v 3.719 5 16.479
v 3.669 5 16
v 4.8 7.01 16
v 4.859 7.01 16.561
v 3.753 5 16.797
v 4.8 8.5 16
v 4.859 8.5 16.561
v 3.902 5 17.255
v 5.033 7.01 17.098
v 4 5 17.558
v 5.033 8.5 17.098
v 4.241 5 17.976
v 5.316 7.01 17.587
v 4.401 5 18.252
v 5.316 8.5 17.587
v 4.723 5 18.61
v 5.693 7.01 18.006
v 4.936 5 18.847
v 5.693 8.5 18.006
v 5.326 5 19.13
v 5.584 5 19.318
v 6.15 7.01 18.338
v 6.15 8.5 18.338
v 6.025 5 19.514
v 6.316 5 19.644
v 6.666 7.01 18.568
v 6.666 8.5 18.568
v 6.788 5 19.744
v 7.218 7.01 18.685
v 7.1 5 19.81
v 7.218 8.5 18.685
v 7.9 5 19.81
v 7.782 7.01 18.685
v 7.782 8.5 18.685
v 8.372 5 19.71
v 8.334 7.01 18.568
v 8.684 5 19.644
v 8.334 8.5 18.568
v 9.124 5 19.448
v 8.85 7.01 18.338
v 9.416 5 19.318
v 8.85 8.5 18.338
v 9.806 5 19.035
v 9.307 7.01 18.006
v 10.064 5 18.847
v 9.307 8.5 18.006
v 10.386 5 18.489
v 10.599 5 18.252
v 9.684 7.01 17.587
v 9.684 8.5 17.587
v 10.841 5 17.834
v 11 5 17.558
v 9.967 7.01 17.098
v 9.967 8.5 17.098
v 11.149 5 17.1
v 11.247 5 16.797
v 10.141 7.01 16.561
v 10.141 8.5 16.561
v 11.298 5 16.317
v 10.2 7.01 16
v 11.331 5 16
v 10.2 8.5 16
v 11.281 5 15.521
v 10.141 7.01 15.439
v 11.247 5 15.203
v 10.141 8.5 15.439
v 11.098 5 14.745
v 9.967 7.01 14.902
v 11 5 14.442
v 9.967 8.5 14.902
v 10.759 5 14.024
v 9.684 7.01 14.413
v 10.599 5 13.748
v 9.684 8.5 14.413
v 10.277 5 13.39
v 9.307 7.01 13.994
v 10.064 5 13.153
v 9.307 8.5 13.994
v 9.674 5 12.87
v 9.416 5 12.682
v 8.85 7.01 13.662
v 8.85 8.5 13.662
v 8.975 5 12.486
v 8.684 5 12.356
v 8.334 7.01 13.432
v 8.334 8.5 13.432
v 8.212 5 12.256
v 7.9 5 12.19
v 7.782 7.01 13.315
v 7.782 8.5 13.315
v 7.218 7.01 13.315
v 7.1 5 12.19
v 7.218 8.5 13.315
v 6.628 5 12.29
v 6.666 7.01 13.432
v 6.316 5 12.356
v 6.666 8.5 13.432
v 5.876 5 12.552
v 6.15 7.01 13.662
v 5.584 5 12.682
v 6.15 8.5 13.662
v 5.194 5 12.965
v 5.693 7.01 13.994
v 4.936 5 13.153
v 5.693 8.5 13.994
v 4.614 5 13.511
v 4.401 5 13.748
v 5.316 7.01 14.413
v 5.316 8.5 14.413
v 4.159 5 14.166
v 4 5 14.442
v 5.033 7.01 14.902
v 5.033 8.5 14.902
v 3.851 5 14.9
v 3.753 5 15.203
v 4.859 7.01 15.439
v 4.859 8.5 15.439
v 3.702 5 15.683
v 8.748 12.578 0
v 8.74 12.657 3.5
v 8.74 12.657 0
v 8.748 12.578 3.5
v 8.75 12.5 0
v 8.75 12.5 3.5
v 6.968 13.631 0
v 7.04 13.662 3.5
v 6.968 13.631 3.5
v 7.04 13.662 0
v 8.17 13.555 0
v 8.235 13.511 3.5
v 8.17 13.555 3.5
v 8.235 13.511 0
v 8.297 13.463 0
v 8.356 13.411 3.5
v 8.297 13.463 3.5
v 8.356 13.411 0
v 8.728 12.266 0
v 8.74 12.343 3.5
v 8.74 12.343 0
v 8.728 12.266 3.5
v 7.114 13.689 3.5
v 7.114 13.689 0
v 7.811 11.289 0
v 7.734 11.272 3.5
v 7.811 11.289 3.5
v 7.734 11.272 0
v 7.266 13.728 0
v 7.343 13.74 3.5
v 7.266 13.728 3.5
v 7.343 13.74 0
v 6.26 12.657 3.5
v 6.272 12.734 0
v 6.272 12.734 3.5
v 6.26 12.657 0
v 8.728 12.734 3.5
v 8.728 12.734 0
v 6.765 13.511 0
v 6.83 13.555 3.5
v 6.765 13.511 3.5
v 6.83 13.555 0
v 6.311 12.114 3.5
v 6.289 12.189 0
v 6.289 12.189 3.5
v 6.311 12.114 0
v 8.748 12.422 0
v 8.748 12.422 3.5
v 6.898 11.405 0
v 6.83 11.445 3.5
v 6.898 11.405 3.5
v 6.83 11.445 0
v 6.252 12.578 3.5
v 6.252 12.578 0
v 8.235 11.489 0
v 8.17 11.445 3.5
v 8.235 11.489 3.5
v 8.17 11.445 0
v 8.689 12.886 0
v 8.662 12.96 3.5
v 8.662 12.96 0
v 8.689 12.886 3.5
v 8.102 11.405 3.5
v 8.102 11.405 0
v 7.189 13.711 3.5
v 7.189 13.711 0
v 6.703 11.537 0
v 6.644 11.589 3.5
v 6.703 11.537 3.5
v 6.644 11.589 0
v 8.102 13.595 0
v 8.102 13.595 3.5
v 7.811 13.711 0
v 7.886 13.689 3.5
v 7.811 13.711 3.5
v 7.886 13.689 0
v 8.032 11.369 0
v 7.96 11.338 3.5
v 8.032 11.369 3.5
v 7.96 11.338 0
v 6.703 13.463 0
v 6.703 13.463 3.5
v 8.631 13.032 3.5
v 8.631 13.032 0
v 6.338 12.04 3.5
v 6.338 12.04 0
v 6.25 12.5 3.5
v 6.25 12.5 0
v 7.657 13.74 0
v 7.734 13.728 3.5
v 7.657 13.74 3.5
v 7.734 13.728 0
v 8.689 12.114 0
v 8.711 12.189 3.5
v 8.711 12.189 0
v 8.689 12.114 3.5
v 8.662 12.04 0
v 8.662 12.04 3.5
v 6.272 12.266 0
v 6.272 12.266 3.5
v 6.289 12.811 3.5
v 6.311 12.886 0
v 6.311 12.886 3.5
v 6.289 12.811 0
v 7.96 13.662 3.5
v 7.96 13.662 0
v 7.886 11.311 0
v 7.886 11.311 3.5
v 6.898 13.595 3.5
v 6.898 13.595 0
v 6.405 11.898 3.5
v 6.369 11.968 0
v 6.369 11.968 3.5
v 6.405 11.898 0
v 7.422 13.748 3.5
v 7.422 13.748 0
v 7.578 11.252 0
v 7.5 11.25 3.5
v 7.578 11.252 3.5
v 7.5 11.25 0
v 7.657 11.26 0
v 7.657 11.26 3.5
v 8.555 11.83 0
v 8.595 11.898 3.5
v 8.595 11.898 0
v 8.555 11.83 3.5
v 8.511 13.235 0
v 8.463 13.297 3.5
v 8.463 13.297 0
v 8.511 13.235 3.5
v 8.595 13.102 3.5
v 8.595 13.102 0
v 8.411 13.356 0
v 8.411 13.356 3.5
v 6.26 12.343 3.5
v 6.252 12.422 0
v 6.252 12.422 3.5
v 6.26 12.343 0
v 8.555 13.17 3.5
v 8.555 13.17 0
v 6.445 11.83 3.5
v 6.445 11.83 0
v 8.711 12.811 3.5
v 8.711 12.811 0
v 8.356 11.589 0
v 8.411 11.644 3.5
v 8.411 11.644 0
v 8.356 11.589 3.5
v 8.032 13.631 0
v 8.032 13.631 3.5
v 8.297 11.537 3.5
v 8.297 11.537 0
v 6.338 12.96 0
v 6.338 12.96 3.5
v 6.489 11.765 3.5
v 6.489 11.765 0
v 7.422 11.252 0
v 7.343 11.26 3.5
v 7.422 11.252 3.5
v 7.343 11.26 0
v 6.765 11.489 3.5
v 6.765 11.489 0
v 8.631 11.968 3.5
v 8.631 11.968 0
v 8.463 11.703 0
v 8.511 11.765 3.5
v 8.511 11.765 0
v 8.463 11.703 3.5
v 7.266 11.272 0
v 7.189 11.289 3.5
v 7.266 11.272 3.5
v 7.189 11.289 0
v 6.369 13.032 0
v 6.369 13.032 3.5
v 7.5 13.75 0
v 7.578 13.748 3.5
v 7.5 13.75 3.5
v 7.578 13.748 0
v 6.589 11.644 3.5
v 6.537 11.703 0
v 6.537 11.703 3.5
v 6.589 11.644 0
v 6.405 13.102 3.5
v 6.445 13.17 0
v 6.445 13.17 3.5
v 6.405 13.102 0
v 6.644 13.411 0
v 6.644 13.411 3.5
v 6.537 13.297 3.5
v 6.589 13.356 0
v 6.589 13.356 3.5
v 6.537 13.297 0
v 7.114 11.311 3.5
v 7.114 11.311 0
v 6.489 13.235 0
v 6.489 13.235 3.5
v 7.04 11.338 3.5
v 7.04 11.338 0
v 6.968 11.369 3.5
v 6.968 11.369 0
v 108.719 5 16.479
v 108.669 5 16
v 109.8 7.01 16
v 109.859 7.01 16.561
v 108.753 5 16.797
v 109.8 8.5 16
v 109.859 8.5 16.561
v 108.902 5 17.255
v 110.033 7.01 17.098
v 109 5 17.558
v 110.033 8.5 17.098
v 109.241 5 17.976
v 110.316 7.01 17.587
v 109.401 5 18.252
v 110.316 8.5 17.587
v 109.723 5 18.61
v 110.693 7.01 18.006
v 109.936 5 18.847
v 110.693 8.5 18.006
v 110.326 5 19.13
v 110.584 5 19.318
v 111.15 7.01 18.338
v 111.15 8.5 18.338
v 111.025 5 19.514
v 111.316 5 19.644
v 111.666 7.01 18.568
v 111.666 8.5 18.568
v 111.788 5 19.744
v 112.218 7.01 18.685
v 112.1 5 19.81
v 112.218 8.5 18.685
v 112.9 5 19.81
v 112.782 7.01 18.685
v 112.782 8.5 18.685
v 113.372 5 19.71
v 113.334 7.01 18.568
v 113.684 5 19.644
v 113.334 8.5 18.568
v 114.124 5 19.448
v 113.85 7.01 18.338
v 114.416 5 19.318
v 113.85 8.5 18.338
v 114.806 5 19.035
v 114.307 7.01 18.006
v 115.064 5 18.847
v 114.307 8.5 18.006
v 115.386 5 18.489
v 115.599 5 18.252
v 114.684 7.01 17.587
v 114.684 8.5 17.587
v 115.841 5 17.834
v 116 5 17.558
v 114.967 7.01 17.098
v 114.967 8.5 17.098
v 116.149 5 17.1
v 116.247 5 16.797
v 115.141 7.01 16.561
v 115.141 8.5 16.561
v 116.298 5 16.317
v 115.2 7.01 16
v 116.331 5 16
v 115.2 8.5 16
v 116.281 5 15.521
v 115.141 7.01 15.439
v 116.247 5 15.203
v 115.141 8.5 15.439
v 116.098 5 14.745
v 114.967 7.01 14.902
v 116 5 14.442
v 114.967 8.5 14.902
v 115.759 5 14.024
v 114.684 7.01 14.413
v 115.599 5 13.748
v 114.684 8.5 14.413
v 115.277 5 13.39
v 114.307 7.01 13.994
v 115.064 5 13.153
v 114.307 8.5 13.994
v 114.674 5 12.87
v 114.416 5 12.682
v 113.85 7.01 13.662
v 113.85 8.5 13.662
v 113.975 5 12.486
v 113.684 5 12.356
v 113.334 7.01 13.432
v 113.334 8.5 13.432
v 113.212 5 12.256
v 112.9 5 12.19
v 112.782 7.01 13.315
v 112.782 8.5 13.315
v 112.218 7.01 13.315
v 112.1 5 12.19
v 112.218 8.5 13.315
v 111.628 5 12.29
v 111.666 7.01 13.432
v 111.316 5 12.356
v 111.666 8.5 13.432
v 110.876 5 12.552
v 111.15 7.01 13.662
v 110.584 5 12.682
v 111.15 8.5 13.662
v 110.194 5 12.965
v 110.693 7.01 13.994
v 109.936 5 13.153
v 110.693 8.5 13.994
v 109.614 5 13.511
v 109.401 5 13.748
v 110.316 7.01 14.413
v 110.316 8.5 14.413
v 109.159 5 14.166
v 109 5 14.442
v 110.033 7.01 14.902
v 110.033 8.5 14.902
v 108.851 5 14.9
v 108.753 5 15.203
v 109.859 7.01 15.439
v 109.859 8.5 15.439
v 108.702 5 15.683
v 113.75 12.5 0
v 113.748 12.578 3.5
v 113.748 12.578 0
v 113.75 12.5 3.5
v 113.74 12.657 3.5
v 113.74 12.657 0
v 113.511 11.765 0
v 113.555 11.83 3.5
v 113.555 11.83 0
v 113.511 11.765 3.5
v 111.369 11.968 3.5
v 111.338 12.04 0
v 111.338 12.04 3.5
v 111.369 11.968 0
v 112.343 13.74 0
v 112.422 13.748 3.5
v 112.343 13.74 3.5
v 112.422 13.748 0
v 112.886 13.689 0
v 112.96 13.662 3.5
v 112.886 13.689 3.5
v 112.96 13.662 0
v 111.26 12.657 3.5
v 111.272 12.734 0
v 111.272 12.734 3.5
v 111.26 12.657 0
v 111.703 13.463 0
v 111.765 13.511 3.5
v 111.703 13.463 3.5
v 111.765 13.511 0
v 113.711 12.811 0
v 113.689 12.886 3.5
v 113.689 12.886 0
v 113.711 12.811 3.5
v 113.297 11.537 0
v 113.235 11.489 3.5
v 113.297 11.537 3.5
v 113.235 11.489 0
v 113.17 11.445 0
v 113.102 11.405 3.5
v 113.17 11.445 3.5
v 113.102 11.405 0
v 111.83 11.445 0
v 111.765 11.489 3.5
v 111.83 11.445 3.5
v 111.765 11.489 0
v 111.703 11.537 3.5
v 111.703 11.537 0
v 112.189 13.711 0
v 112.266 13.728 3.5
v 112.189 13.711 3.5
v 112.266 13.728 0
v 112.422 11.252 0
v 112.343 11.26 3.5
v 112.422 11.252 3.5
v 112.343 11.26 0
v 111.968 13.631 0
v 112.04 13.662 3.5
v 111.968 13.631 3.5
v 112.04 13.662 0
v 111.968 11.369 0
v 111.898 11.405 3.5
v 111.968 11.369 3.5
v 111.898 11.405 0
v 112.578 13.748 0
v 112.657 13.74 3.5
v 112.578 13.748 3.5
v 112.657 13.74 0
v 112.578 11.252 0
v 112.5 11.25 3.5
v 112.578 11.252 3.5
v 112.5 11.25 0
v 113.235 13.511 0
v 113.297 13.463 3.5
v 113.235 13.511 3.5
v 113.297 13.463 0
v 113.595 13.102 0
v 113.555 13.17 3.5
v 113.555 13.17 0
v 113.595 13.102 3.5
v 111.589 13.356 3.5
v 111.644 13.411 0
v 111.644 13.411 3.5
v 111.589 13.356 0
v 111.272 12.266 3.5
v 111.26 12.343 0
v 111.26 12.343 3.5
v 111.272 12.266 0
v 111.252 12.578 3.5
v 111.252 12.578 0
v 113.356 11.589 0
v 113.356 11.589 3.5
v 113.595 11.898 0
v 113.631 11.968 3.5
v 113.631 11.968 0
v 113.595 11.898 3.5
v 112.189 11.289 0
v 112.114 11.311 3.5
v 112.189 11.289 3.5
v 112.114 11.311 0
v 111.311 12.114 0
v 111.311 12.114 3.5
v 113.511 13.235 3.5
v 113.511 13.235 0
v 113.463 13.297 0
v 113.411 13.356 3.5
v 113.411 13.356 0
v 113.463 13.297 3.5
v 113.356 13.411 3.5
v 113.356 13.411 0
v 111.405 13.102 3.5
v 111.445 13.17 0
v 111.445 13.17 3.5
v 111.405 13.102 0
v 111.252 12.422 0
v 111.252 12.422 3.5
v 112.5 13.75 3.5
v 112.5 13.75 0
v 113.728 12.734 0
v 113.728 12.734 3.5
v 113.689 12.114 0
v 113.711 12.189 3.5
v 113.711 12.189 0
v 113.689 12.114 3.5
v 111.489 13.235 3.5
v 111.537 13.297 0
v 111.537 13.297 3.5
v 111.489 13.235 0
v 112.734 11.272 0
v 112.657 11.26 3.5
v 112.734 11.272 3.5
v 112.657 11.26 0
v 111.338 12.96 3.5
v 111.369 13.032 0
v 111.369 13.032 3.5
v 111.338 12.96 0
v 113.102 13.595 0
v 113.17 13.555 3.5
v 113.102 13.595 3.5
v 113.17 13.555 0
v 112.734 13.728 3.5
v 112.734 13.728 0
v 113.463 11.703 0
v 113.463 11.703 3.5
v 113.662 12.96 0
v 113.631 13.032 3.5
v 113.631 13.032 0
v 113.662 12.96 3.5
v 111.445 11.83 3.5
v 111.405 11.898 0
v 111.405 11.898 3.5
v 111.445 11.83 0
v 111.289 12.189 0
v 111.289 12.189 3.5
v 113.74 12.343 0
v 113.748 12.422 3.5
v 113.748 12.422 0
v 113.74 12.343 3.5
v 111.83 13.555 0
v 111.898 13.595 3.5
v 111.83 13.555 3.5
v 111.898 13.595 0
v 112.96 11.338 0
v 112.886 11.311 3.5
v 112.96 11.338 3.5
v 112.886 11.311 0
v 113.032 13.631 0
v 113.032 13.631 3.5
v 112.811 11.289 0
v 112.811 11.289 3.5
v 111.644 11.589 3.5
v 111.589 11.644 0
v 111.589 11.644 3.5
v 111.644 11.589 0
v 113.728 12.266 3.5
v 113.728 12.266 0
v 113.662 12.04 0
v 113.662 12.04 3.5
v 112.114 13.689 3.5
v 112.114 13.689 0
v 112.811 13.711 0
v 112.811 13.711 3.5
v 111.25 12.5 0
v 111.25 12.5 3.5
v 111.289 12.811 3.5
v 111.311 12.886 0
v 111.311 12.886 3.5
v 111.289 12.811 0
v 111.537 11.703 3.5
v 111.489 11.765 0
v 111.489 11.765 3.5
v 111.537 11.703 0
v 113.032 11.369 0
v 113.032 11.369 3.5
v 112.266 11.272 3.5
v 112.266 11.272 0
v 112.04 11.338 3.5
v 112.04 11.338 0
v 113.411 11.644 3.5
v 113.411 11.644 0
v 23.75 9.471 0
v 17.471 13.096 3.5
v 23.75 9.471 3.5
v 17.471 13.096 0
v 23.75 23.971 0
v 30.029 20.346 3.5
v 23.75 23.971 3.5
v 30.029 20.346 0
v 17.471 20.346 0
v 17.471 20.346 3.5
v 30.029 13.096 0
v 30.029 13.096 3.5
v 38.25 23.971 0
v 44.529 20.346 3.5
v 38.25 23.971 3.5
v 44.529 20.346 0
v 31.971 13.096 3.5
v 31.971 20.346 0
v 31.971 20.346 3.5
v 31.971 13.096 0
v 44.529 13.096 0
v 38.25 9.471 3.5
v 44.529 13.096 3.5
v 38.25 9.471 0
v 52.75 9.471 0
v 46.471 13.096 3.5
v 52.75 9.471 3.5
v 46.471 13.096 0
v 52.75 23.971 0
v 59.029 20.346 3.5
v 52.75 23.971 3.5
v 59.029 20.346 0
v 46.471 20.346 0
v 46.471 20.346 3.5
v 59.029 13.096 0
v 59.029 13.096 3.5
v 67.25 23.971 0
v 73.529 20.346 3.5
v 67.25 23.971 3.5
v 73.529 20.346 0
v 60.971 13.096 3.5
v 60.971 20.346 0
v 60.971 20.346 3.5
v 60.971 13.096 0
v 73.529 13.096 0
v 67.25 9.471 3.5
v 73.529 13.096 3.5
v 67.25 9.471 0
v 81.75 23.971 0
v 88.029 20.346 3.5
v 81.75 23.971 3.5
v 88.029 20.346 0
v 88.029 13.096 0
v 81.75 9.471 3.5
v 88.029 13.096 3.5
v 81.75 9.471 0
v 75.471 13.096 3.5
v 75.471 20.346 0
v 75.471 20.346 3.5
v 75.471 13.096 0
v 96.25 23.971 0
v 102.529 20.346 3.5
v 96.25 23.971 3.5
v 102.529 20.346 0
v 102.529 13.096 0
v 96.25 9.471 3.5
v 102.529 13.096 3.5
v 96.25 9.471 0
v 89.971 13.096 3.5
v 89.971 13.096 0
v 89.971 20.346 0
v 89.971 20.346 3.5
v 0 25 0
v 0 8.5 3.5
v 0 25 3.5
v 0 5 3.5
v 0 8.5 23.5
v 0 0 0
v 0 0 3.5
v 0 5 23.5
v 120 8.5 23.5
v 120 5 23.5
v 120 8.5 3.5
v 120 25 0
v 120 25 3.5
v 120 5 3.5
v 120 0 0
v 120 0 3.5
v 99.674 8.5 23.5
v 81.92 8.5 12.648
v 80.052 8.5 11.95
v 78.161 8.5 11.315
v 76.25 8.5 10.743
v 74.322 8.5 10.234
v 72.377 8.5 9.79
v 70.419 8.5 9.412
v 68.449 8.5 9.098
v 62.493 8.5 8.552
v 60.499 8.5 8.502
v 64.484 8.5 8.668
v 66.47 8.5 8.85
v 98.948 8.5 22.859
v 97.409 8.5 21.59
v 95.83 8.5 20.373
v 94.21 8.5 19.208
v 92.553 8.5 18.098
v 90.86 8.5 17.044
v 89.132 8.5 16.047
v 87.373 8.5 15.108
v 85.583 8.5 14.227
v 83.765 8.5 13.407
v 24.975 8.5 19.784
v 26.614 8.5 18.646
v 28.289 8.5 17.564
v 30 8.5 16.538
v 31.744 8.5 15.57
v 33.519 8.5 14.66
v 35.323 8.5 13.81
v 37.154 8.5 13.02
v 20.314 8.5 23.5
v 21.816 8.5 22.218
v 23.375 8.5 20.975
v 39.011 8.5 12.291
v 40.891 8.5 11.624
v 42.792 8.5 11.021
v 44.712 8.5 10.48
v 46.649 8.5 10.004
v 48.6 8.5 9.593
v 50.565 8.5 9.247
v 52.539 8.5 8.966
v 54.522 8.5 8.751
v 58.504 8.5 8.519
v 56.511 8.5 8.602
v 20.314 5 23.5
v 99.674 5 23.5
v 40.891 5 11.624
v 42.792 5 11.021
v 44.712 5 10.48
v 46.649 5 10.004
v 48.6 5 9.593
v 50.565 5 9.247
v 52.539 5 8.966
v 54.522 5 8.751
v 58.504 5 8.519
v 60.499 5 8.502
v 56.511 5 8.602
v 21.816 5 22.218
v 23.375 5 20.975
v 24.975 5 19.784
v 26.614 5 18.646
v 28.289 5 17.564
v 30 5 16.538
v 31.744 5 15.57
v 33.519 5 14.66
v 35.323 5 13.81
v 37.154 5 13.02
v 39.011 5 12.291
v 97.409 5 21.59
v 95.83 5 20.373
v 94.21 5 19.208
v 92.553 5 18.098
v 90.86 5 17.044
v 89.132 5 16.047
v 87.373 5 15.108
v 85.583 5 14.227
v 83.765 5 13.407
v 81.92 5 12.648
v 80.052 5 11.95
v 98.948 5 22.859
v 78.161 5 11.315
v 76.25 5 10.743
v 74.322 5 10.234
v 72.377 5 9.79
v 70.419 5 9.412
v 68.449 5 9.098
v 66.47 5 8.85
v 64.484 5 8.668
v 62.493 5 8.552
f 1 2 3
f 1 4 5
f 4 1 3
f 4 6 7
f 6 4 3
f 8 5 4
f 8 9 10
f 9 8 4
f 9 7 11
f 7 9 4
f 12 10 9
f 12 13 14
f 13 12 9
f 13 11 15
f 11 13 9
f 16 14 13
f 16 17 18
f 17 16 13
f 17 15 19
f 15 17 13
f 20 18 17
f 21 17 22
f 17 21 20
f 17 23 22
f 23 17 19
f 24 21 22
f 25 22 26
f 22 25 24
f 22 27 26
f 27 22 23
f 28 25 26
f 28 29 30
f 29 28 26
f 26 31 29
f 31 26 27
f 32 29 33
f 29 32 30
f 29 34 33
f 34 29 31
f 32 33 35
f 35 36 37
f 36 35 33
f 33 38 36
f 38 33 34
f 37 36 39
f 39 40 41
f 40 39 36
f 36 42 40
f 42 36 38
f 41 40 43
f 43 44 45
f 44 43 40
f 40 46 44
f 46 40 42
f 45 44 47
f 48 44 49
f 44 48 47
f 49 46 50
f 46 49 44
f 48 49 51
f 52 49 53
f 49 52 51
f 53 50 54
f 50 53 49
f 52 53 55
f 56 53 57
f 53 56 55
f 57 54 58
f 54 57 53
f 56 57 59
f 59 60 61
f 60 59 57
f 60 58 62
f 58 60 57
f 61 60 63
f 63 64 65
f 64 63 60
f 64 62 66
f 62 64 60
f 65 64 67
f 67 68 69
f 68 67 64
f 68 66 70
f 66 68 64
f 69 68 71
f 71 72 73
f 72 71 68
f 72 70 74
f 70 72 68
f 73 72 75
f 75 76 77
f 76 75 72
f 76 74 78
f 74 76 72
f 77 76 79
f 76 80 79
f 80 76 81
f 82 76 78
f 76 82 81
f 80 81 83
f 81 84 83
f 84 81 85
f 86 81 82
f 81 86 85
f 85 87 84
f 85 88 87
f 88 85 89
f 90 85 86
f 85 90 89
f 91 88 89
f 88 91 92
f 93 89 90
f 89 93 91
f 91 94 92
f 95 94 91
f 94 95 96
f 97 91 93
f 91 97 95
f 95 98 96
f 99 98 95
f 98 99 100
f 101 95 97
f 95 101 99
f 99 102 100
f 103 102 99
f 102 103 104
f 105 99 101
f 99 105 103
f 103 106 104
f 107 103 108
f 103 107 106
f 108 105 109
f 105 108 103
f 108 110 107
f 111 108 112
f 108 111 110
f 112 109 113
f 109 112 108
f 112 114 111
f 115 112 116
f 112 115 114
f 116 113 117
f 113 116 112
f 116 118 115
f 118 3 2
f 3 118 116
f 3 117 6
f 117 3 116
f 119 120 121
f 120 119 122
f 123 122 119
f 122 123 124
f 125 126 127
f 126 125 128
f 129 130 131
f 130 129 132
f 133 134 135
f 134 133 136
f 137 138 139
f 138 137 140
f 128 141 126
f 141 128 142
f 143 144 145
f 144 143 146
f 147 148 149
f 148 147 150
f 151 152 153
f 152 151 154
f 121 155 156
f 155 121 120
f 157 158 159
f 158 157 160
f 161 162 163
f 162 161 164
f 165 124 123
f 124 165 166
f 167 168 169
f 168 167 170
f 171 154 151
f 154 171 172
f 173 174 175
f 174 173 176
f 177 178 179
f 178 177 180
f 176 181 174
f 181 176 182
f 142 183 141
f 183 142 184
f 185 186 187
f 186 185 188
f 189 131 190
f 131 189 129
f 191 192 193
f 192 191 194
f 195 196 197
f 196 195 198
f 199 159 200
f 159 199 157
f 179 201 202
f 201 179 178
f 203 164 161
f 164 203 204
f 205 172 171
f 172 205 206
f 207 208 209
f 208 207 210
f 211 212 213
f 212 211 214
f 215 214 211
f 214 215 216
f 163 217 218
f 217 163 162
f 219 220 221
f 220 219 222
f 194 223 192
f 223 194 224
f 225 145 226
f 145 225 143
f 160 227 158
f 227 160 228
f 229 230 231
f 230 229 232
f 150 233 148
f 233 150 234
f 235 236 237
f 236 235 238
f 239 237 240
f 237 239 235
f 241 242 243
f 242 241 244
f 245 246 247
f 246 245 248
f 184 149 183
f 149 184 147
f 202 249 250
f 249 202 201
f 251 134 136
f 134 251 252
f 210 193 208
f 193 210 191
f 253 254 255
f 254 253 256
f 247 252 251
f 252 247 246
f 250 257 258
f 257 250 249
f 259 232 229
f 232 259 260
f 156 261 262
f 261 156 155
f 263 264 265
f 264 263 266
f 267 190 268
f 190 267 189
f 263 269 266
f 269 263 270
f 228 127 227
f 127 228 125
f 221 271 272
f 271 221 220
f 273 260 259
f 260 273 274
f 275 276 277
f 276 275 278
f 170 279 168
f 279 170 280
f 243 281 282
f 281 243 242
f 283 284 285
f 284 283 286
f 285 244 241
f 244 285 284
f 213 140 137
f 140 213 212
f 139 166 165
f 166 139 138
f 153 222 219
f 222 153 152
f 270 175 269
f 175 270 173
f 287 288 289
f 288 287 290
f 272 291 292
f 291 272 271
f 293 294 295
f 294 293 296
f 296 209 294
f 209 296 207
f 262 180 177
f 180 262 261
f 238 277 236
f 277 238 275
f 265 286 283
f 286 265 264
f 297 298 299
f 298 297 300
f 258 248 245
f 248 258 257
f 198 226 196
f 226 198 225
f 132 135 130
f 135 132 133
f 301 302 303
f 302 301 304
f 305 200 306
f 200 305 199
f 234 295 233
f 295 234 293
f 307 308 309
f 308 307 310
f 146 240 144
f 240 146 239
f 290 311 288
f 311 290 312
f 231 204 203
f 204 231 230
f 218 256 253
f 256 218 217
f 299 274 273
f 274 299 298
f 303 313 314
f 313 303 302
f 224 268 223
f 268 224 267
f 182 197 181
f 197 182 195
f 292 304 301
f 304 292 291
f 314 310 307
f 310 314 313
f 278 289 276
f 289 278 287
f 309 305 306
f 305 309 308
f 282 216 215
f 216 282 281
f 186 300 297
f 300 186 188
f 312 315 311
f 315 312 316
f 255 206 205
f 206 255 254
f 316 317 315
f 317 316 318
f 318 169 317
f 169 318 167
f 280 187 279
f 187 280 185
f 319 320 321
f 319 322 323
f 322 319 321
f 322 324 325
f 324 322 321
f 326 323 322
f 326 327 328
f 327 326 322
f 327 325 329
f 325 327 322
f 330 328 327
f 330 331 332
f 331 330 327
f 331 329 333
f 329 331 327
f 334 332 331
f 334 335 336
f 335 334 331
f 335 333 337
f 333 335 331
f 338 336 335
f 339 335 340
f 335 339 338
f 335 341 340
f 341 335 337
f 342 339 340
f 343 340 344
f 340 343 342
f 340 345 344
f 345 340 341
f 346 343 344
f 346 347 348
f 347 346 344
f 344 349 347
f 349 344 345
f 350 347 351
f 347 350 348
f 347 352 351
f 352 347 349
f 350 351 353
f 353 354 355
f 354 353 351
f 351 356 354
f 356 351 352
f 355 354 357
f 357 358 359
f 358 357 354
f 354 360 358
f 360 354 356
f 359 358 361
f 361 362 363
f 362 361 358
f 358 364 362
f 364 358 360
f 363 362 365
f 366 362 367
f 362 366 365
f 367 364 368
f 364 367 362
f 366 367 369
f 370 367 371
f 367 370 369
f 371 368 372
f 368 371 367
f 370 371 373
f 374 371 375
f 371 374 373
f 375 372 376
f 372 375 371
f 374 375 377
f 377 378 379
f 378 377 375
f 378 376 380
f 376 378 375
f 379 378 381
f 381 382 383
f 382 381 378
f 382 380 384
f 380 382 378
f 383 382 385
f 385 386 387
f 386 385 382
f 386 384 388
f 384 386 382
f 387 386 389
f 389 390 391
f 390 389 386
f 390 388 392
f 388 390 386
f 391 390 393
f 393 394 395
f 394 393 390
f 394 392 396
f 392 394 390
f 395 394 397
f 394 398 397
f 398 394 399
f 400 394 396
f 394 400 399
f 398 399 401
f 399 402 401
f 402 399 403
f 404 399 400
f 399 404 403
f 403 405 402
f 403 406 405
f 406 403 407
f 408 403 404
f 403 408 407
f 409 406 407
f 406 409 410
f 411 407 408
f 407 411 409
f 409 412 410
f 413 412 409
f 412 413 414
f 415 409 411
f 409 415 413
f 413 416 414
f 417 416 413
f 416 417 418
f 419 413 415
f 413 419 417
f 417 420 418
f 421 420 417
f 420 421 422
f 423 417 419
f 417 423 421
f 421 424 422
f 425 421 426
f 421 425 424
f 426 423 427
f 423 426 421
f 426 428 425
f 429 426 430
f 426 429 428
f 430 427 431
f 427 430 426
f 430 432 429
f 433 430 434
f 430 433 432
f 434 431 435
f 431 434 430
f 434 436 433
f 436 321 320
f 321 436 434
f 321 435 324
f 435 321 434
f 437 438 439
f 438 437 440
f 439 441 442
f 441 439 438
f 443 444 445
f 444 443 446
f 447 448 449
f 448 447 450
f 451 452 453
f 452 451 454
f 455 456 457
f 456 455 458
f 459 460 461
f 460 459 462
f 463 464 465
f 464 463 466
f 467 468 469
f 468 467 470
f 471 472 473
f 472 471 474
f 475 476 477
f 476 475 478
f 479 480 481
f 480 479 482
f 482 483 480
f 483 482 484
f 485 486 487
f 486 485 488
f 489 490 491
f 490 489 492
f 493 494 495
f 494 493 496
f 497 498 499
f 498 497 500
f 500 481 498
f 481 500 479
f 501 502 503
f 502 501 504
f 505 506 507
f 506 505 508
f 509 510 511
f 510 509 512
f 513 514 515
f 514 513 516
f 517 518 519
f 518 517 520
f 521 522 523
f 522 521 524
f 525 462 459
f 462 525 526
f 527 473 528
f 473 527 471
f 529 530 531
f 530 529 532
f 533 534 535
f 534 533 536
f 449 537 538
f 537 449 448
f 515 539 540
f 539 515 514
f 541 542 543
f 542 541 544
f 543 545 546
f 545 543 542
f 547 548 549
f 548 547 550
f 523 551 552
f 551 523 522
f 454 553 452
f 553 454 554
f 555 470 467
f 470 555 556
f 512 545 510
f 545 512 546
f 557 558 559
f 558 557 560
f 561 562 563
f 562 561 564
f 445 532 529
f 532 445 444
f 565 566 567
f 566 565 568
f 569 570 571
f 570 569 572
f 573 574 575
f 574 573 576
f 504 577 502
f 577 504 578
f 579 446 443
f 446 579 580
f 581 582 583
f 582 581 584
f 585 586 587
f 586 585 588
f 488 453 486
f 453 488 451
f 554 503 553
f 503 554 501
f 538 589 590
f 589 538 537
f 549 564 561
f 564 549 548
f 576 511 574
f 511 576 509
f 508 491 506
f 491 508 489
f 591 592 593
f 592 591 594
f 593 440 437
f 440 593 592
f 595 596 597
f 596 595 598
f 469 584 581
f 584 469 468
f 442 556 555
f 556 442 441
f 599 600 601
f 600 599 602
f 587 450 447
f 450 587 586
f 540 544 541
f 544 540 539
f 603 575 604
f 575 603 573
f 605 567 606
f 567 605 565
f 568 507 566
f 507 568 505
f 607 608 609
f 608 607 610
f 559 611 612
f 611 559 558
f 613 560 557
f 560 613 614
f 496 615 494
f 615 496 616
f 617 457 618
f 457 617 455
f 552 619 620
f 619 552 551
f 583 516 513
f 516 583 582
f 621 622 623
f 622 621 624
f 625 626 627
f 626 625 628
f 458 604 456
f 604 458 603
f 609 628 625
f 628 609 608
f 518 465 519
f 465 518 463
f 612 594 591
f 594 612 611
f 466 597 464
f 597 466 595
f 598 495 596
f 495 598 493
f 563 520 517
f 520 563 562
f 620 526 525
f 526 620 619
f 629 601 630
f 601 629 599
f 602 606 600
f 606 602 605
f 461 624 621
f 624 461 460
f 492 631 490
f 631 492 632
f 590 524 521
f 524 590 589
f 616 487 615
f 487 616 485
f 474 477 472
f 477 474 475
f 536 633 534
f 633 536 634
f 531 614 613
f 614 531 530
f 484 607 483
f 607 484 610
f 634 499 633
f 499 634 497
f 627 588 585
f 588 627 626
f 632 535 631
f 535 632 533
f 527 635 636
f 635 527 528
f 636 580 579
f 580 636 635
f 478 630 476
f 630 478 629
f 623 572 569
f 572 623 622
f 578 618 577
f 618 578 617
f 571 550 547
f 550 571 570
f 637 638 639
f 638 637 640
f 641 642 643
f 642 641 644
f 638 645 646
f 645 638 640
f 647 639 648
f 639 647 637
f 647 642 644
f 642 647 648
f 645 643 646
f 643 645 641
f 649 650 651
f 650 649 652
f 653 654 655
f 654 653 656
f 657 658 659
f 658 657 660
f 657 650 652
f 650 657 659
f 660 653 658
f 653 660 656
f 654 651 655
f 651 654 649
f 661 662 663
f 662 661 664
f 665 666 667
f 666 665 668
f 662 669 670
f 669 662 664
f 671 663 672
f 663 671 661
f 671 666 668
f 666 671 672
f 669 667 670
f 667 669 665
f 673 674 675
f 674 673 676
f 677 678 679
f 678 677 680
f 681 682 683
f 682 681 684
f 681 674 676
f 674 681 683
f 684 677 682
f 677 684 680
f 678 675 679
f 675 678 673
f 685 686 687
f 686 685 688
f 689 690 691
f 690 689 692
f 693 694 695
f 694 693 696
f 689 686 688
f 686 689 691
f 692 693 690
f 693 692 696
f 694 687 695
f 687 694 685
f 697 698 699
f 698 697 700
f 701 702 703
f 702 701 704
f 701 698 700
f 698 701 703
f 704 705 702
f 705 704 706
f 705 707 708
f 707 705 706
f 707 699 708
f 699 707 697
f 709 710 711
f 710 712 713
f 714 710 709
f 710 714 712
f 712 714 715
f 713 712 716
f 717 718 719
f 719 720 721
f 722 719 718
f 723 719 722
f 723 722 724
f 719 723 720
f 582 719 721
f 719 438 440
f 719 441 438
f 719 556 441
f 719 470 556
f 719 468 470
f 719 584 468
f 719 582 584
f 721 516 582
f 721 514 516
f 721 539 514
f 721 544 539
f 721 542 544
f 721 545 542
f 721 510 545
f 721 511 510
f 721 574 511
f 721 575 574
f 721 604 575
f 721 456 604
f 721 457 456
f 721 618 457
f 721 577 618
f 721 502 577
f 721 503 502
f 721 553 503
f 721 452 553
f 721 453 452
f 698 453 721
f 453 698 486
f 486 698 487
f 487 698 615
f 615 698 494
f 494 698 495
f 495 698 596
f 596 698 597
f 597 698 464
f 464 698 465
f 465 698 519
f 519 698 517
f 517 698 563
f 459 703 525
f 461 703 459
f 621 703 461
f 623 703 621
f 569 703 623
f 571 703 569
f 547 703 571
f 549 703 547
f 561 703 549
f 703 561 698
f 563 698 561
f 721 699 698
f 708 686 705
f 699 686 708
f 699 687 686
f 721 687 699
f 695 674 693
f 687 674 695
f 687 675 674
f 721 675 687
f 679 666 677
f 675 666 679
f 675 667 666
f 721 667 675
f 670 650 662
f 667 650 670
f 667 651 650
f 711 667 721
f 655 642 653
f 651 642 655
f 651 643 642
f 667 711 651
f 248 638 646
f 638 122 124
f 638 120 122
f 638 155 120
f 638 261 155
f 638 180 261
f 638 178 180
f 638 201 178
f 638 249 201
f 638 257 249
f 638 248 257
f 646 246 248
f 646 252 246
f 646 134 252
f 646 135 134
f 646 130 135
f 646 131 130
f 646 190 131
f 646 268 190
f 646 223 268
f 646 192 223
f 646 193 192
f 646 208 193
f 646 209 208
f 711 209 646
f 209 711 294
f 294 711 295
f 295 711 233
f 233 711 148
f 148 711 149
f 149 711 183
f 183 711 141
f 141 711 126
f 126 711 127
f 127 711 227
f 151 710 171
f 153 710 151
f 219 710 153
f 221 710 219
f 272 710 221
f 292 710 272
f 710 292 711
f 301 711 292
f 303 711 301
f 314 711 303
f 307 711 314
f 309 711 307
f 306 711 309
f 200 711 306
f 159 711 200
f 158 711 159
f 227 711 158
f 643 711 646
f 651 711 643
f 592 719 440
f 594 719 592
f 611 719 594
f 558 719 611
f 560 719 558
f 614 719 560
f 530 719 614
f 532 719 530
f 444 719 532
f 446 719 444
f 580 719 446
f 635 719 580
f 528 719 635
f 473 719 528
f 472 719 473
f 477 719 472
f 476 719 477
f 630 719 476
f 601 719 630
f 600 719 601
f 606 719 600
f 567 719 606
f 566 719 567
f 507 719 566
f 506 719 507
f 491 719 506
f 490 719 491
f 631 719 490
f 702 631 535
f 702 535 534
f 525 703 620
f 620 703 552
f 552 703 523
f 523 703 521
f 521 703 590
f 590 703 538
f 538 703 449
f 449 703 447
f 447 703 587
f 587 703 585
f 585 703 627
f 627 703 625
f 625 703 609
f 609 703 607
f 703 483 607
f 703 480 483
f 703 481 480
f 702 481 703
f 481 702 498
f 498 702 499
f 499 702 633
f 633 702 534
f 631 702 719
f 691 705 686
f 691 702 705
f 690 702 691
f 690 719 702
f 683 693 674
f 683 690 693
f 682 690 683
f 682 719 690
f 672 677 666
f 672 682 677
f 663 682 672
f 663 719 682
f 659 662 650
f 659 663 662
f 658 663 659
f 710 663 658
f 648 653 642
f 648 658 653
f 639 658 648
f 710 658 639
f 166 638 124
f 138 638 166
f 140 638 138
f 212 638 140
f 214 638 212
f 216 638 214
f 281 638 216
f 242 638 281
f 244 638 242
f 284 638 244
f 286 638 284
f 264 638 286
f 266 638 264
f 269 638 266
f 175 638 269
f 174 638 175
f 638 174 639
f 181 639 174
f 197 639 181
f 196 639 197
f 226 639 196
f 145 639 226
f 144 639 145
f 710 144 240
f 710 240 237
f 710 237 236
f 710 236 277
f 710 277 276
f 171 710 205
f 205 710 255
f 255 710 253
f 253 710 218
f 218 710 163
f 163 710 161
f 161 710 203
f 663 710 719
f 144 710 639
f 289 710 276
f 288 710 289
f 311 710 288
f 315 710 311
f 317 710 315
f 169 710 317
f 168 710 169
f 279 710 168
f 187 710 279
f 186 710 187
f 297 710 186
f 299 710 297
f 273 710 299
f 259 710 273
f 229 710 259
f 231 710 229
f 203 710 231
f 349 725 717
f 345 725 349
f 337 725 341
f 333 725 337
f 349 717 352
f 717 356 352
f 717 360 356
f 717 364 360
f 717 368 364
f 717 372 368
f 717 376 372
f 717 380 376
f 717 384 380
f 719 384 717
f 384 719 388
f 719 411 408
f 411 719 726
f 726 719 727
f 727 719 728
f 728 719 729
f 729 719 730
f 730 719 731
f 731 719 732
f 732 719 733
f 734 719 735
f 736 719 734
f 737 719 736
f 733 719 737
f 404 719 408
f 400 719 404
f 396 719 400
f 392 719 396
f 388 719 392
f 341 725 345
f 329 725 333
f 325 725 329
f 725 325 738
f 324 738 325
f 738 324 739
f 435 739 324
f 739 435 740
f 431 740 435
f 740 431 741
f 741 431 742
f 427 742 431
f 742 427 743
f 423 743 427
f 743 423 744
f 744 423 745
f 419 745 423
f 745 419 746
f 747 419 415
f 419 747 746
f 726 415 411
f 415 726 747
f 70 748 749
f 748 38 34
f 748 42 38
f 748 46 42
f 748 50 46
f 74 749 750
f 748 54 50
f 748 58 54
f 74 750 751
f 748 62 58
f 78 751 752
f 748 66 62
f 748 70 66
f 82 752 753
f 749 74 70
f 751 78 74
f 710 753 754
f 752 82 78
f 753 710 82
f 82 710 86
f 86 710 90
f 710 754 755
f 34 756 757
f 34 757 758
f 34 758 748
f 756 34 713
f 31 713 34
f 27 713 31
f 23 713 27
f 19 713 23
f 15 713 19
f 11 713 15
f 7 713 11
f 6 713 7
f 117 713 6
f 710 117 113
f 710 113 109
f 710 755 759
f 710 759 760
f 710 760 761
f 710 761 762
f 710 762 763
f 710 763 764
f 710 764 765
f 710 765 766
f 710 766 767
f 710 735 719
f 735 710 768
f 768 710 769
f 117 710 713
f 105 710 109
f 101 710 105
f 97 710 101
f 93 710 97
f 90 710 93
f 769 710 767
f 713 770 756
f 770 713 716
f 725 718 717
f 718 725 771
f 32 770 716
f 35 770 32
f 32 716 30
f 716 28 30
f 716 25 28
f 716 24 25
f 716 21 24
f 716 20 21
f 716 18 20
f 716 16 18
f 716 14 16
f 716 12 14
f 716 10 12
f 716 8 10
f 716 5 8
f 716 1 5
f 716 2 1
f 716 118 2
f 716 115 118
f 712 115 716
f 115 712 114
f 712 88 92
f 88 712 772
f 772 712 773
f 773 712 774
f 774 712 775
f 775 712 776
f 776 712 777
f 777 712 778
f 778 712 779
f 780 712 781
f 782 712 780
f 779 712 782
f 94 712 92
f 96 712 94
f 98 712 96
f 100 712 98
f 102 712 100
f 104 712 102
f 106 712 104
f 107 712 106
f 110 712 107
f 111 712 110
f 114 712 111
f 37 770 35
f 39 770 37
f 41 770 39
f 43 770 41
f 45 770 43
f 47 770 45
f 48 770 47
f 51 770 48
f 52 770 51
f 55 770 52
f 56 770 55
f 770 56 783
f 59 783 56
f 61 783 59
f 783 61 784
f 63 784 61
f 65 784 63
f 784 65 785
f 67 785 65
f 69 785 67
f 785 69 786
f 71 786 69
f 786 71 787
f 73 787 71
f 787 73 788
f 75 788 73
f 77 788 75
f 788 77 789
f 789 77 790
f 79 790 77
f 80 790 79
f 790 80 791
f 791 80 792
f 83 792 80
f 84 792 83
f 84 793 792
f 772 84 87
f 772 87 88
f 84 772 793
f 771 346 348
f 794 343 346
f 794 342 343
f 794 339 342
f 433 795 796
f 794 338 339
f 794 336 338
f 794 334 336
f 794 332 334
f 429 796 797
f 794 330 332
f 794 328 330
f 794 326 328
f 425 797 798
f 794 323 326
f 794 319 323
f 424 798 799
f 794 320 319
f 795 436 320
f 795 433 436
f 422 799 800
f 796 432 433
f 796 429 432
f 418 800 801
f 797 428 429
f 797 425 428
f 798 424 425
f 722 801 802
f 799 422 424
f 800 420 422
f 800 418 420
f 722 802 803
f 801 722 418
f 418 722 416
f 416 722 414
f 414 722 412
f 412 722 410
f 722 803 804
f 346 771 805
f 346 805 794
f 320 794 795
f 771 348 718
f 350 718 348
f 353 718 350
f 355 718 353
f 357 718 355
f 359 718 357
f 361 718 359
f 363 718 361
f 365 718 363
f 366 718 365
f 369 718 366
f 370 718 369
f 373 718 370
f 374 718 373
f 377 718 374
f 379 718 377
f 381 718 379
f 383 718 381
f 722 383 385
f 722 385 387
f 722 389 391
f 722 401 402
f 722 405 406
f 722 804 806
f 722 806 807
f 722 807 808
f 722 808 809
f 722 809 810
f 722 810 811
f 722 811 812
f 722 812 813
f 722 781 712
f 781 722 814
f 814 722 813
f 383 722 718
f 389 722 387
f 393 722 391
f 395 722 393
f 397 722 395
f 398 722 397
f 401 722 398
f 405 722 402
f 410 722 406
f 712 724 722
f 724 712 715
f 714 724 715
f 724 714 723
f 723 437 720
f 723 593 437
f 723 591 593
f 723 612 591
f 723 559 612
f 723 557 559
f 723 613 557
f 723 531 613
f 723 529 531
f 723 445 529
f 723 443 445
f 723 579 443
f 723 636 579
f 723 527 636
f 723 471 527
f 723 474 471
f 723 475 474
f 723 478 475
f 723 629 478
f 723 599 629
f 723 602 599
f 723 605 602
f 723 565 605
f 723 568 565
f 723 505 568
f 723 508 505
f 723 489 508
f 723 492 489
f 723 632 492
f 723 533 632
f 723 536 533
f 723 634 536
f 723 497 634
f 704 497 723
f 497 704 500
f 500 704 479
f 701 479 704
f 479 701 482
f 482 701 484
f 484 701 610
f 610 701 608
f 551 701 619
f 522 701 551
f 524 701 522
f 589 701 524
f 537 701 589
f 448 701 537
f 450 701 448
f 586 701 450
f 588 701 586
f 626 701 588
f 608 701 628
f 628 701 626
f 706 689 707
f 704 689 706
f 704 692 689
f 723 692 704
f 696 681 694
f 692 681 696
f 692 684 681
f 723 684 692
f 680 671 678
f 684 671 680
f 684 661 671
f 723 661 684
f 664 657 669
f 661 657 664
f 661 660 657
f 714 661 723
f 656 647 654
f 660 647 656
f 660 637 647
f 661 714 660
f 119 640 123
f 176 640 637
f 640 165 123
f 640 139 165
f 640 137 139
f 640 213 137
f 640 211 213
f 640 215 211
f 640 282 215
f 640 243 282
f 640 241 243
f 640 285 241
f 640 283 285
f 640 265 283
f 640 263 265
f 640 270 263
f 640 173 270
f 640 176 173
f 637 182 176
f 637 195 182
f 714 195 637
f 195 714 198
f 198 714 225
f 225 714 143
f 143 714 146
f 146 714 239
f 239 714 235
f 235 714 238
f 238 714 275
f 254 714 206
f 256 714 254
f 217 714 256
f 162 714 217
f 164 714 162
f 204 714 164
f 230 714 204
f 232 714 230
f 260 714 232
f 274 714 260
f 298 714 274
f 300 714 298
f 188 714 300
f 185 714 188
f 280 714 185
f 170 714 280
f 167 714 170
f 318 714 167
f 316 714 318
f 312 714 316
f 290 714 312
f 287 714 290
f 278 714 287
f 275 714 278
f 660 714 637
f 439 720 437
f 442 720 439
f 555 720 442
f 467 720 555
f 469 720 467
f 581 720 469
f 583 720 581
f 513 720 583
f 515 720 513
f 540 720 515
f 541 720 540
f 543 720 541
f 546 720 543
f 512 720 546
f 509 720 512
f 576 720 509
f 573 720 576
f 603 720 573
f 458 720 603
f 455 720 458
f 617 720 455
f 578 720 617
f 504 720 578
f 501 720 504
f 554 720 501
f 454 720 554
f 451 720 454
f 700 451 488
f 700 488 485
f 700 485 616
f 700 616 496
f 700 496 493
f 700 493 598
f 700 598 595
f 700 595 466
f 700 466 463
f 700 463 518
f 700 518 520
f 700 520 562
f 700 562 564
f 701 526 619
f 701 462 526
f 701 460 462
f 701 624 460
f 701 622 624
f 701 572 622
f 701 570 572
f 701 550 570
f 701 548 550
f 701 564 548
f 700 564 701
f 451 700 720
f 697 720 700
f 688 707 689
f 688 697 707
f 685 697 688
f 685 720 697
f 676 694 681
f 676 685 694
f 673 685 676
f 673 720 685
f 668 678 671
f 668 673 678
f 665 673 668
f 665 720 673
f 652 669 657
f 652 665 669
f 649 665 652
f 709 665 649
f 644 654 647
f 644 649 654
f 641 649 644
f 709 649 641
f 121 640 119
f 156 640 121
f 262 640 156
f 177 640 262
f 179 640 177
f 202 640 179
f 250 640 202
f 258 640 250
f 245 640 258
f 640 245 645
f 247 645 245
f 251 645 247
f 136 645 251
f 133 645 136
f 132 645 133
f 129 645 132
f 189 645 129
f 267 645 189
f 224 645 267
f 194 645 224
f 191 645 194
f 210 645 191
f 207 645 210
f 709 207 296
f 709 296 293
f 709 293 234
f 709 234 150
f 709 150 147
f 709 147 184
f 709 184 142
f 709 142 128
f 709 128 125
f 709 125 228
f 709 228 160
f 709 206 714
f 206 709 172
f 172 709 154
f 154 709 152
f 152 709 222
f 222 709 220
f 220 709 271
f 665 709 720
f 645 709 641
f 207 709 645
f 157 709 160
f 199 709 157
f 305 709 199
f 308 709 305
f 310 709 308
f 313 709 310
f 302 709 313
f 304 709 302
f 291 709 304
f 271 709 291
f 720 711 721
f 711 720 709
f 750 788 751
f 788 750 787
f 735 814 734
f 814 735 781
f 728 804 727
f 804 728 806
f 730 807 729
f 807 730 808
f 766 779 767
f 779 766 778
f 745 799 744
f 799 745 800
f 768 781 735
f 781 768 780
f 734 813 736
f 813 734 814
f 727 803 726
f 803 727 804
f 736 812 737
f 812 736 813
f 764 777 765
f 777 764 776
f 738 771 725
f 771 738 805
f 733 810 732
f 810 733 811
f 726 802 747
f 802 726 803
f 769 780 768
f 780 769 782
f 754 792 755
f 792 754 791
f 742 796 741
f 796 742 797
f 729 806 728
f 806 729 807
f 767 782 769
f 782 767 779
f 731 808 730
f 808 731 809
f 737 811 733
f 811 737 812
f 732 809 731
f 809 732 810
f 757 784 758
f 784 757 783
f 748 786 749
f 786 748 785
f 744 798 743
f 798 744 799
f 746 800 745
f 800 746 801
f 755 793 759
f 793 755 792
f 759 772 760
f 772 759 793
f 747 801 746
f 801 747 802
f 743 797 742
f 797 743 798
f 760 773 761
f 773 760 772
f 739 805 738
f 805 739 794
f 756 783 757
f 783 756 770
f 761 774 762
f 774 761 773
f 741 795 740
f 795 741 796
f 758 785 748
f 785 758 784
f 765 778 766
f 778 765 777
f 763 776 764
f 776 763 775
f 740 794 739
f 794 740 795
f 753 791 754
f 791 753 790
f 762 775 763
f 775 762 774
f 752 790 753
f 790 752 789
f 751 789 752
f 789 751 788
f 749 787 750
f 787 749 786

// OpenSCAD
// file: Structures/Hexagon.scad
// created by IndiePandaaaaa | Lukas

function hexagon_get_inner_diameter(single_outer_diameter = 20) = tan(60) * (single_outer_diameter / 2);

function hexagon_inbetween_distance_x(single_outer_diameter = 20) = single_outer_diameter -
    hexagon_get_inner_diameter(single_outer_diameter);

function hexagon_get_y_inner_element_additional_height(single_outer_diameter = 20) = single_outer_diameter / 2 +
        hexagon_inbetween_distance_x(single_outer_diameter) * cos(30) + (single_outer_diameter / 2) * cos(60);

function hexagon_get_y_outer_element_height(single_outer_diameter = 20) = single_outer_diameter;

function hexagon_get_y_next_structure(single_outer_diameter = 20) = (single_outer_diameter / 2 * 3) +
            hexagon_inbetween_distance_x(single_outer_diameter) * cos(30) * 2;

function hexagon_get_y_element_height(single_outer_diameter = 20) = hexagon_get_y_outer_element_height(
single_outer_diameter) + hexagon_get_y_inner_element_additional_height(single_outer_diameter);

function hexagon_get_x_element_count(width, single_outer_diameter = 20) = floor(width / single_outer_diameter);

function hexagon_get_y_element_count(depth, single_outer_diameter = 20) = floor(((depth - (hexagon_get_y_element_height(
single_outer_diameter) -
    hexagon_get_y_next_structure(single_outer_diameter))) / hexagon_get_y_next_structure(single_outer_diameter)) * 2);

function hexagon_get_used_width(width, single_outer_diameter = 20) = single_outer_diameter *
    hexagon_get_x_element_count(width, single_outer_diameter) - hexagon_inbetween_distance_x(single_outer_diameter);

//function hexagon_get_used_depth(depth, single_outer_diameter = 20) = hexagon_get_y_next_structure(single_outer_diameter)
//    * (floor(depth / hexagon_get_y_next_structure(single_outer_diameter))) + (hexagon_inbetween_distance_x(single_outer_diameter)) * cos(30);

//function hexagon_get_used_depth(depth, single_outer_diameter = 20) = (hexagon_get_y_element_count(depth,single_outer_diameter) - 1) * 
//			hexagon_get_y_next_structure(single_outer_diameter) + hexagon_get_y_element_height(single_outer_diameter);

function hexagon_get_used_depth(depth, single_outer_diameter = 20) = round(hexagon_get_y_element_count(depth,
single_outer_diameter) / 2) * hexagon_get_y_outer_element_height(single_outer_diameter) +
        floor(hexagon_get_y_element_count(depth, single_outer_diameter) / 2) * (hexagon_get_y_next_structure(
    single_outer_diameter) - single_outer_diameter) +
            (hexagon_get_y_element_count(depth, single_outer_diameter) + 1) % 2 * (hexagon_get_y_element_height(
    single_outer_diameter) - hexagon_get_y_next_structure(single_outer_diameter));

module hexagon_pattern(width, depth, thickness, single_outer_diameter = 20, vertices = 6) {
    inner_diameter = hexagon_get_inner_diameter(single_outer_diameter);

    count_x = hexagon_get_x_element_count(width, single_outer_diameter);
    count_y = hexagon_get_y_element_count(depth, single_outer_diameter);

    angle = 360 / vertices * 1.5;

    for (y = [0:count_y - 1]) {
        for (x = [0:count_x - 1]) {

            if (y % 2 == 0) {
                translate([inner_diameter / 2 + single_outer_diameter * x, (single_outer_diameter / 2) + inner_diameter
                    * y, - 0.01]) {
                    linear_extrude(height = thickness + 0.02) {
                        rotate([0, 0, angle]) circle(d = single_outer_diameter, $fn = vertices);
                    }
                }
            } else if (x < count_x - 1 && y % 2 == 1) {
                translate([inner_diameter / 2 + single_outer_diameter * x + single_outer_diameter / 2,
                        (single_outer_diameter / 2) + inner_diameter * y, - 0.01]) {
                    linear_extrude(height = thickness + 0.02) {
                        rotate([0, 0, angle]) circle(d = single_outer_diameter, $fn = vertices);
                    }
                }
            }

        }
    }
}

width = 100;
depth = 100;
difference() {
    cube([width, depth, 3]);
    translate([(width - hexagon_get_used_width(width)) / 2, (depth - hexagon_get_used_depth(depth)) / 2, 0])
        hexagon_pattern(width, depth, 3);
}
// file: Parts/Screw.scad
module screw(diameter, length, cutout_sample = false, fs = 0.1, fa = 1) {
    //$fs = 0.1; [size in mm] | $fa = 1; [degrees]
    //$fn = 100; [defined faces]

    module base_model(diameter, length, cone_height, cone_diameter, offset = 0, fs = 0.1, fa = 1) {
        rotate_extrude($fs = fs) {
            polygon([
                    [0, 0],
                    [(diameter + offset) / 2, 0],
                    [(diameter + offset) / 2, (length + offset) - (cone_height + offset)],
                    [(cone_diameter + offset) / 2, length + offset],
                    [0, length + offset],
                ]);
        }
    }

    if (length < diameter) {
        echo("Screw is too short");
        length = diameter + 1;
        echo("New length is: ", length);
    }

    cone_height = diameter * 0.85;
    cone_diameter = diameter * 2;

    if (!cutout_sample) {
        translate([0, 0, - length])
            difference() {
                base_model(diameter, length, cone_height, cone_diameter);

                // top cross part
                translate([0, 0, length + 0.1 - (cone_height - diameter / 2)])
                    difference() {
                        rotate([0, 0, 45])
                            rotate_extrude($fn = 4) {
                                polygon([
                                        [0, 0],
                                        [diameter * 1.4 / 2, 0],
                                        [cone_diameter / 2, cone_height - diameter / 2],
                                        [0, cone_height - diameter / 2],
                                    ]);
                            }
                        for (i = [0 : 1 : 3]) {
                            rotate([0, 0, 90 * i])
                                translate([diameter / 3.18 / 2, diameter / 3.18 / 2, - 0.1])
                                    cube(cone_height + 0.2);
                        }
                    }
            }
    } else {
        offset = 0.2;
        translate([0, 0, - length - offset / 2])
            base_model(diameter, length, cone_height, cone_diameter, offset);
    }
}

function screw_cone_diameter(screw_diameter) = screw_diameter * 2;

screw(3.5, 12);
// main file
// created by IndiePandaaaaa

use <Parts/Screw.scad>
use <Structures/Hexagon.scad>

MODEL_TOLERANCE = 0.15;
MATERIAL_THICKNESS = 3.5;

// DIAMETER -> DISTANCE: 140 -> 125 | 120 -> 105 | 80 -> 71.5
FAN_SCREW_DISTANCE = 105;
FAN_DIAMETER = 120;
FAN_DEPTH = 25;

SCREW_OFFSET = (FAN_DIAMETER - FAN_SCREW_DISTANCE) / 2;
SCREW_DIAMETER = 5.2; // the hole in the fan has the diameter 4.3 mm
HEIGHT_FROM_FLOOR = 5;

M3_HOLE = 2.5; // see https://de.wikipedia.org/wiki/Kernloch for more information

difference() {
    rotate([90, 0, 90])
        linear_extrude(height = FAN_DIAMETER) {
            polygon([
                    [0, 0],
                    [FAN_DEPTH, 0],
                    [FAN_DEPTH, MATERIAL_THICKNESS],
                    [MATERIAL_THICKNESS + FAN_DEPTH / 5, MATERIAL_THICKNESS],
                    [MATERIAL_THICKNESS + FAN_DEPTH / 5, MATERIAL_THICKNESS + SCREW_OFFSET * 2 + HEIGHT_FROM_FLOOR],
                    [FAN_DEPTH / 5, MATERIAL_THICKNESS + SCREW_OFFSET * 2 + HEIGHT_FROM_FLOOR],
                    [FAN_DEPTH / 5, MATERIAL_THICKNESS],
                    [0, MATERIAL_THICKNESS],
                ]);
        }
    translate([FAN_DIAMETER / 2, FAN_DEPTH + 0.01, FAN_DIAMETER / 2 + MATERIAL_THICKNESS + HEIGHT_FROM_FLOOR])
        rotate([90, 0, 0])
            cylinder(h = FAN_DEPTH + 0.02, d = FAN_DIAMETER, $fa = 1);

    for (i = [0:1]) {
        translate([SCREW_OFFSET + FAN_SCREW_DISTANCE * i, FAN_DEPTH / 10 - 0.01,
                    MATERIAL_THICKNESS + HEIGHT_FROM_FLOOR + SCREW_OFFSET])
            rotate([90, 0, 0]) screw(SCREW_DIAMETER, FAN_DEPTH + 0.02, true);

        translate([SCREW_OFFSET + FAN_SCREW_DISTANCE * i, FAN_DEPTH / 2, - 0.01])
            cylinder(h = MATERIAL_THICKNESS + 0.02, d = M3_HOLE, $fn = 100);
    }

    HEX_OD = FAN_DEPTH - (FAN_DEPTH / 5) - MATERIAL_THICKNESS - 2;
    usable_width = FAN_DIAMETER - SCREW_OFFSET * 3;
    translate([(FAN_DIAMETER - hexagon_get_used_width(usable_width, HEX_OD)) / 2,
                    FAN_DEPTH / 5 + MATERIAL_THICKNESS + (HEX_OD - hexagon_get_used_width(HEX_OD + 2, HEX_OD)) / 2, 0])
        hexagon_pattern(usable_width, HEX_OD + 2, MATERIAL_THICKNESS, HEX_OD);
}
